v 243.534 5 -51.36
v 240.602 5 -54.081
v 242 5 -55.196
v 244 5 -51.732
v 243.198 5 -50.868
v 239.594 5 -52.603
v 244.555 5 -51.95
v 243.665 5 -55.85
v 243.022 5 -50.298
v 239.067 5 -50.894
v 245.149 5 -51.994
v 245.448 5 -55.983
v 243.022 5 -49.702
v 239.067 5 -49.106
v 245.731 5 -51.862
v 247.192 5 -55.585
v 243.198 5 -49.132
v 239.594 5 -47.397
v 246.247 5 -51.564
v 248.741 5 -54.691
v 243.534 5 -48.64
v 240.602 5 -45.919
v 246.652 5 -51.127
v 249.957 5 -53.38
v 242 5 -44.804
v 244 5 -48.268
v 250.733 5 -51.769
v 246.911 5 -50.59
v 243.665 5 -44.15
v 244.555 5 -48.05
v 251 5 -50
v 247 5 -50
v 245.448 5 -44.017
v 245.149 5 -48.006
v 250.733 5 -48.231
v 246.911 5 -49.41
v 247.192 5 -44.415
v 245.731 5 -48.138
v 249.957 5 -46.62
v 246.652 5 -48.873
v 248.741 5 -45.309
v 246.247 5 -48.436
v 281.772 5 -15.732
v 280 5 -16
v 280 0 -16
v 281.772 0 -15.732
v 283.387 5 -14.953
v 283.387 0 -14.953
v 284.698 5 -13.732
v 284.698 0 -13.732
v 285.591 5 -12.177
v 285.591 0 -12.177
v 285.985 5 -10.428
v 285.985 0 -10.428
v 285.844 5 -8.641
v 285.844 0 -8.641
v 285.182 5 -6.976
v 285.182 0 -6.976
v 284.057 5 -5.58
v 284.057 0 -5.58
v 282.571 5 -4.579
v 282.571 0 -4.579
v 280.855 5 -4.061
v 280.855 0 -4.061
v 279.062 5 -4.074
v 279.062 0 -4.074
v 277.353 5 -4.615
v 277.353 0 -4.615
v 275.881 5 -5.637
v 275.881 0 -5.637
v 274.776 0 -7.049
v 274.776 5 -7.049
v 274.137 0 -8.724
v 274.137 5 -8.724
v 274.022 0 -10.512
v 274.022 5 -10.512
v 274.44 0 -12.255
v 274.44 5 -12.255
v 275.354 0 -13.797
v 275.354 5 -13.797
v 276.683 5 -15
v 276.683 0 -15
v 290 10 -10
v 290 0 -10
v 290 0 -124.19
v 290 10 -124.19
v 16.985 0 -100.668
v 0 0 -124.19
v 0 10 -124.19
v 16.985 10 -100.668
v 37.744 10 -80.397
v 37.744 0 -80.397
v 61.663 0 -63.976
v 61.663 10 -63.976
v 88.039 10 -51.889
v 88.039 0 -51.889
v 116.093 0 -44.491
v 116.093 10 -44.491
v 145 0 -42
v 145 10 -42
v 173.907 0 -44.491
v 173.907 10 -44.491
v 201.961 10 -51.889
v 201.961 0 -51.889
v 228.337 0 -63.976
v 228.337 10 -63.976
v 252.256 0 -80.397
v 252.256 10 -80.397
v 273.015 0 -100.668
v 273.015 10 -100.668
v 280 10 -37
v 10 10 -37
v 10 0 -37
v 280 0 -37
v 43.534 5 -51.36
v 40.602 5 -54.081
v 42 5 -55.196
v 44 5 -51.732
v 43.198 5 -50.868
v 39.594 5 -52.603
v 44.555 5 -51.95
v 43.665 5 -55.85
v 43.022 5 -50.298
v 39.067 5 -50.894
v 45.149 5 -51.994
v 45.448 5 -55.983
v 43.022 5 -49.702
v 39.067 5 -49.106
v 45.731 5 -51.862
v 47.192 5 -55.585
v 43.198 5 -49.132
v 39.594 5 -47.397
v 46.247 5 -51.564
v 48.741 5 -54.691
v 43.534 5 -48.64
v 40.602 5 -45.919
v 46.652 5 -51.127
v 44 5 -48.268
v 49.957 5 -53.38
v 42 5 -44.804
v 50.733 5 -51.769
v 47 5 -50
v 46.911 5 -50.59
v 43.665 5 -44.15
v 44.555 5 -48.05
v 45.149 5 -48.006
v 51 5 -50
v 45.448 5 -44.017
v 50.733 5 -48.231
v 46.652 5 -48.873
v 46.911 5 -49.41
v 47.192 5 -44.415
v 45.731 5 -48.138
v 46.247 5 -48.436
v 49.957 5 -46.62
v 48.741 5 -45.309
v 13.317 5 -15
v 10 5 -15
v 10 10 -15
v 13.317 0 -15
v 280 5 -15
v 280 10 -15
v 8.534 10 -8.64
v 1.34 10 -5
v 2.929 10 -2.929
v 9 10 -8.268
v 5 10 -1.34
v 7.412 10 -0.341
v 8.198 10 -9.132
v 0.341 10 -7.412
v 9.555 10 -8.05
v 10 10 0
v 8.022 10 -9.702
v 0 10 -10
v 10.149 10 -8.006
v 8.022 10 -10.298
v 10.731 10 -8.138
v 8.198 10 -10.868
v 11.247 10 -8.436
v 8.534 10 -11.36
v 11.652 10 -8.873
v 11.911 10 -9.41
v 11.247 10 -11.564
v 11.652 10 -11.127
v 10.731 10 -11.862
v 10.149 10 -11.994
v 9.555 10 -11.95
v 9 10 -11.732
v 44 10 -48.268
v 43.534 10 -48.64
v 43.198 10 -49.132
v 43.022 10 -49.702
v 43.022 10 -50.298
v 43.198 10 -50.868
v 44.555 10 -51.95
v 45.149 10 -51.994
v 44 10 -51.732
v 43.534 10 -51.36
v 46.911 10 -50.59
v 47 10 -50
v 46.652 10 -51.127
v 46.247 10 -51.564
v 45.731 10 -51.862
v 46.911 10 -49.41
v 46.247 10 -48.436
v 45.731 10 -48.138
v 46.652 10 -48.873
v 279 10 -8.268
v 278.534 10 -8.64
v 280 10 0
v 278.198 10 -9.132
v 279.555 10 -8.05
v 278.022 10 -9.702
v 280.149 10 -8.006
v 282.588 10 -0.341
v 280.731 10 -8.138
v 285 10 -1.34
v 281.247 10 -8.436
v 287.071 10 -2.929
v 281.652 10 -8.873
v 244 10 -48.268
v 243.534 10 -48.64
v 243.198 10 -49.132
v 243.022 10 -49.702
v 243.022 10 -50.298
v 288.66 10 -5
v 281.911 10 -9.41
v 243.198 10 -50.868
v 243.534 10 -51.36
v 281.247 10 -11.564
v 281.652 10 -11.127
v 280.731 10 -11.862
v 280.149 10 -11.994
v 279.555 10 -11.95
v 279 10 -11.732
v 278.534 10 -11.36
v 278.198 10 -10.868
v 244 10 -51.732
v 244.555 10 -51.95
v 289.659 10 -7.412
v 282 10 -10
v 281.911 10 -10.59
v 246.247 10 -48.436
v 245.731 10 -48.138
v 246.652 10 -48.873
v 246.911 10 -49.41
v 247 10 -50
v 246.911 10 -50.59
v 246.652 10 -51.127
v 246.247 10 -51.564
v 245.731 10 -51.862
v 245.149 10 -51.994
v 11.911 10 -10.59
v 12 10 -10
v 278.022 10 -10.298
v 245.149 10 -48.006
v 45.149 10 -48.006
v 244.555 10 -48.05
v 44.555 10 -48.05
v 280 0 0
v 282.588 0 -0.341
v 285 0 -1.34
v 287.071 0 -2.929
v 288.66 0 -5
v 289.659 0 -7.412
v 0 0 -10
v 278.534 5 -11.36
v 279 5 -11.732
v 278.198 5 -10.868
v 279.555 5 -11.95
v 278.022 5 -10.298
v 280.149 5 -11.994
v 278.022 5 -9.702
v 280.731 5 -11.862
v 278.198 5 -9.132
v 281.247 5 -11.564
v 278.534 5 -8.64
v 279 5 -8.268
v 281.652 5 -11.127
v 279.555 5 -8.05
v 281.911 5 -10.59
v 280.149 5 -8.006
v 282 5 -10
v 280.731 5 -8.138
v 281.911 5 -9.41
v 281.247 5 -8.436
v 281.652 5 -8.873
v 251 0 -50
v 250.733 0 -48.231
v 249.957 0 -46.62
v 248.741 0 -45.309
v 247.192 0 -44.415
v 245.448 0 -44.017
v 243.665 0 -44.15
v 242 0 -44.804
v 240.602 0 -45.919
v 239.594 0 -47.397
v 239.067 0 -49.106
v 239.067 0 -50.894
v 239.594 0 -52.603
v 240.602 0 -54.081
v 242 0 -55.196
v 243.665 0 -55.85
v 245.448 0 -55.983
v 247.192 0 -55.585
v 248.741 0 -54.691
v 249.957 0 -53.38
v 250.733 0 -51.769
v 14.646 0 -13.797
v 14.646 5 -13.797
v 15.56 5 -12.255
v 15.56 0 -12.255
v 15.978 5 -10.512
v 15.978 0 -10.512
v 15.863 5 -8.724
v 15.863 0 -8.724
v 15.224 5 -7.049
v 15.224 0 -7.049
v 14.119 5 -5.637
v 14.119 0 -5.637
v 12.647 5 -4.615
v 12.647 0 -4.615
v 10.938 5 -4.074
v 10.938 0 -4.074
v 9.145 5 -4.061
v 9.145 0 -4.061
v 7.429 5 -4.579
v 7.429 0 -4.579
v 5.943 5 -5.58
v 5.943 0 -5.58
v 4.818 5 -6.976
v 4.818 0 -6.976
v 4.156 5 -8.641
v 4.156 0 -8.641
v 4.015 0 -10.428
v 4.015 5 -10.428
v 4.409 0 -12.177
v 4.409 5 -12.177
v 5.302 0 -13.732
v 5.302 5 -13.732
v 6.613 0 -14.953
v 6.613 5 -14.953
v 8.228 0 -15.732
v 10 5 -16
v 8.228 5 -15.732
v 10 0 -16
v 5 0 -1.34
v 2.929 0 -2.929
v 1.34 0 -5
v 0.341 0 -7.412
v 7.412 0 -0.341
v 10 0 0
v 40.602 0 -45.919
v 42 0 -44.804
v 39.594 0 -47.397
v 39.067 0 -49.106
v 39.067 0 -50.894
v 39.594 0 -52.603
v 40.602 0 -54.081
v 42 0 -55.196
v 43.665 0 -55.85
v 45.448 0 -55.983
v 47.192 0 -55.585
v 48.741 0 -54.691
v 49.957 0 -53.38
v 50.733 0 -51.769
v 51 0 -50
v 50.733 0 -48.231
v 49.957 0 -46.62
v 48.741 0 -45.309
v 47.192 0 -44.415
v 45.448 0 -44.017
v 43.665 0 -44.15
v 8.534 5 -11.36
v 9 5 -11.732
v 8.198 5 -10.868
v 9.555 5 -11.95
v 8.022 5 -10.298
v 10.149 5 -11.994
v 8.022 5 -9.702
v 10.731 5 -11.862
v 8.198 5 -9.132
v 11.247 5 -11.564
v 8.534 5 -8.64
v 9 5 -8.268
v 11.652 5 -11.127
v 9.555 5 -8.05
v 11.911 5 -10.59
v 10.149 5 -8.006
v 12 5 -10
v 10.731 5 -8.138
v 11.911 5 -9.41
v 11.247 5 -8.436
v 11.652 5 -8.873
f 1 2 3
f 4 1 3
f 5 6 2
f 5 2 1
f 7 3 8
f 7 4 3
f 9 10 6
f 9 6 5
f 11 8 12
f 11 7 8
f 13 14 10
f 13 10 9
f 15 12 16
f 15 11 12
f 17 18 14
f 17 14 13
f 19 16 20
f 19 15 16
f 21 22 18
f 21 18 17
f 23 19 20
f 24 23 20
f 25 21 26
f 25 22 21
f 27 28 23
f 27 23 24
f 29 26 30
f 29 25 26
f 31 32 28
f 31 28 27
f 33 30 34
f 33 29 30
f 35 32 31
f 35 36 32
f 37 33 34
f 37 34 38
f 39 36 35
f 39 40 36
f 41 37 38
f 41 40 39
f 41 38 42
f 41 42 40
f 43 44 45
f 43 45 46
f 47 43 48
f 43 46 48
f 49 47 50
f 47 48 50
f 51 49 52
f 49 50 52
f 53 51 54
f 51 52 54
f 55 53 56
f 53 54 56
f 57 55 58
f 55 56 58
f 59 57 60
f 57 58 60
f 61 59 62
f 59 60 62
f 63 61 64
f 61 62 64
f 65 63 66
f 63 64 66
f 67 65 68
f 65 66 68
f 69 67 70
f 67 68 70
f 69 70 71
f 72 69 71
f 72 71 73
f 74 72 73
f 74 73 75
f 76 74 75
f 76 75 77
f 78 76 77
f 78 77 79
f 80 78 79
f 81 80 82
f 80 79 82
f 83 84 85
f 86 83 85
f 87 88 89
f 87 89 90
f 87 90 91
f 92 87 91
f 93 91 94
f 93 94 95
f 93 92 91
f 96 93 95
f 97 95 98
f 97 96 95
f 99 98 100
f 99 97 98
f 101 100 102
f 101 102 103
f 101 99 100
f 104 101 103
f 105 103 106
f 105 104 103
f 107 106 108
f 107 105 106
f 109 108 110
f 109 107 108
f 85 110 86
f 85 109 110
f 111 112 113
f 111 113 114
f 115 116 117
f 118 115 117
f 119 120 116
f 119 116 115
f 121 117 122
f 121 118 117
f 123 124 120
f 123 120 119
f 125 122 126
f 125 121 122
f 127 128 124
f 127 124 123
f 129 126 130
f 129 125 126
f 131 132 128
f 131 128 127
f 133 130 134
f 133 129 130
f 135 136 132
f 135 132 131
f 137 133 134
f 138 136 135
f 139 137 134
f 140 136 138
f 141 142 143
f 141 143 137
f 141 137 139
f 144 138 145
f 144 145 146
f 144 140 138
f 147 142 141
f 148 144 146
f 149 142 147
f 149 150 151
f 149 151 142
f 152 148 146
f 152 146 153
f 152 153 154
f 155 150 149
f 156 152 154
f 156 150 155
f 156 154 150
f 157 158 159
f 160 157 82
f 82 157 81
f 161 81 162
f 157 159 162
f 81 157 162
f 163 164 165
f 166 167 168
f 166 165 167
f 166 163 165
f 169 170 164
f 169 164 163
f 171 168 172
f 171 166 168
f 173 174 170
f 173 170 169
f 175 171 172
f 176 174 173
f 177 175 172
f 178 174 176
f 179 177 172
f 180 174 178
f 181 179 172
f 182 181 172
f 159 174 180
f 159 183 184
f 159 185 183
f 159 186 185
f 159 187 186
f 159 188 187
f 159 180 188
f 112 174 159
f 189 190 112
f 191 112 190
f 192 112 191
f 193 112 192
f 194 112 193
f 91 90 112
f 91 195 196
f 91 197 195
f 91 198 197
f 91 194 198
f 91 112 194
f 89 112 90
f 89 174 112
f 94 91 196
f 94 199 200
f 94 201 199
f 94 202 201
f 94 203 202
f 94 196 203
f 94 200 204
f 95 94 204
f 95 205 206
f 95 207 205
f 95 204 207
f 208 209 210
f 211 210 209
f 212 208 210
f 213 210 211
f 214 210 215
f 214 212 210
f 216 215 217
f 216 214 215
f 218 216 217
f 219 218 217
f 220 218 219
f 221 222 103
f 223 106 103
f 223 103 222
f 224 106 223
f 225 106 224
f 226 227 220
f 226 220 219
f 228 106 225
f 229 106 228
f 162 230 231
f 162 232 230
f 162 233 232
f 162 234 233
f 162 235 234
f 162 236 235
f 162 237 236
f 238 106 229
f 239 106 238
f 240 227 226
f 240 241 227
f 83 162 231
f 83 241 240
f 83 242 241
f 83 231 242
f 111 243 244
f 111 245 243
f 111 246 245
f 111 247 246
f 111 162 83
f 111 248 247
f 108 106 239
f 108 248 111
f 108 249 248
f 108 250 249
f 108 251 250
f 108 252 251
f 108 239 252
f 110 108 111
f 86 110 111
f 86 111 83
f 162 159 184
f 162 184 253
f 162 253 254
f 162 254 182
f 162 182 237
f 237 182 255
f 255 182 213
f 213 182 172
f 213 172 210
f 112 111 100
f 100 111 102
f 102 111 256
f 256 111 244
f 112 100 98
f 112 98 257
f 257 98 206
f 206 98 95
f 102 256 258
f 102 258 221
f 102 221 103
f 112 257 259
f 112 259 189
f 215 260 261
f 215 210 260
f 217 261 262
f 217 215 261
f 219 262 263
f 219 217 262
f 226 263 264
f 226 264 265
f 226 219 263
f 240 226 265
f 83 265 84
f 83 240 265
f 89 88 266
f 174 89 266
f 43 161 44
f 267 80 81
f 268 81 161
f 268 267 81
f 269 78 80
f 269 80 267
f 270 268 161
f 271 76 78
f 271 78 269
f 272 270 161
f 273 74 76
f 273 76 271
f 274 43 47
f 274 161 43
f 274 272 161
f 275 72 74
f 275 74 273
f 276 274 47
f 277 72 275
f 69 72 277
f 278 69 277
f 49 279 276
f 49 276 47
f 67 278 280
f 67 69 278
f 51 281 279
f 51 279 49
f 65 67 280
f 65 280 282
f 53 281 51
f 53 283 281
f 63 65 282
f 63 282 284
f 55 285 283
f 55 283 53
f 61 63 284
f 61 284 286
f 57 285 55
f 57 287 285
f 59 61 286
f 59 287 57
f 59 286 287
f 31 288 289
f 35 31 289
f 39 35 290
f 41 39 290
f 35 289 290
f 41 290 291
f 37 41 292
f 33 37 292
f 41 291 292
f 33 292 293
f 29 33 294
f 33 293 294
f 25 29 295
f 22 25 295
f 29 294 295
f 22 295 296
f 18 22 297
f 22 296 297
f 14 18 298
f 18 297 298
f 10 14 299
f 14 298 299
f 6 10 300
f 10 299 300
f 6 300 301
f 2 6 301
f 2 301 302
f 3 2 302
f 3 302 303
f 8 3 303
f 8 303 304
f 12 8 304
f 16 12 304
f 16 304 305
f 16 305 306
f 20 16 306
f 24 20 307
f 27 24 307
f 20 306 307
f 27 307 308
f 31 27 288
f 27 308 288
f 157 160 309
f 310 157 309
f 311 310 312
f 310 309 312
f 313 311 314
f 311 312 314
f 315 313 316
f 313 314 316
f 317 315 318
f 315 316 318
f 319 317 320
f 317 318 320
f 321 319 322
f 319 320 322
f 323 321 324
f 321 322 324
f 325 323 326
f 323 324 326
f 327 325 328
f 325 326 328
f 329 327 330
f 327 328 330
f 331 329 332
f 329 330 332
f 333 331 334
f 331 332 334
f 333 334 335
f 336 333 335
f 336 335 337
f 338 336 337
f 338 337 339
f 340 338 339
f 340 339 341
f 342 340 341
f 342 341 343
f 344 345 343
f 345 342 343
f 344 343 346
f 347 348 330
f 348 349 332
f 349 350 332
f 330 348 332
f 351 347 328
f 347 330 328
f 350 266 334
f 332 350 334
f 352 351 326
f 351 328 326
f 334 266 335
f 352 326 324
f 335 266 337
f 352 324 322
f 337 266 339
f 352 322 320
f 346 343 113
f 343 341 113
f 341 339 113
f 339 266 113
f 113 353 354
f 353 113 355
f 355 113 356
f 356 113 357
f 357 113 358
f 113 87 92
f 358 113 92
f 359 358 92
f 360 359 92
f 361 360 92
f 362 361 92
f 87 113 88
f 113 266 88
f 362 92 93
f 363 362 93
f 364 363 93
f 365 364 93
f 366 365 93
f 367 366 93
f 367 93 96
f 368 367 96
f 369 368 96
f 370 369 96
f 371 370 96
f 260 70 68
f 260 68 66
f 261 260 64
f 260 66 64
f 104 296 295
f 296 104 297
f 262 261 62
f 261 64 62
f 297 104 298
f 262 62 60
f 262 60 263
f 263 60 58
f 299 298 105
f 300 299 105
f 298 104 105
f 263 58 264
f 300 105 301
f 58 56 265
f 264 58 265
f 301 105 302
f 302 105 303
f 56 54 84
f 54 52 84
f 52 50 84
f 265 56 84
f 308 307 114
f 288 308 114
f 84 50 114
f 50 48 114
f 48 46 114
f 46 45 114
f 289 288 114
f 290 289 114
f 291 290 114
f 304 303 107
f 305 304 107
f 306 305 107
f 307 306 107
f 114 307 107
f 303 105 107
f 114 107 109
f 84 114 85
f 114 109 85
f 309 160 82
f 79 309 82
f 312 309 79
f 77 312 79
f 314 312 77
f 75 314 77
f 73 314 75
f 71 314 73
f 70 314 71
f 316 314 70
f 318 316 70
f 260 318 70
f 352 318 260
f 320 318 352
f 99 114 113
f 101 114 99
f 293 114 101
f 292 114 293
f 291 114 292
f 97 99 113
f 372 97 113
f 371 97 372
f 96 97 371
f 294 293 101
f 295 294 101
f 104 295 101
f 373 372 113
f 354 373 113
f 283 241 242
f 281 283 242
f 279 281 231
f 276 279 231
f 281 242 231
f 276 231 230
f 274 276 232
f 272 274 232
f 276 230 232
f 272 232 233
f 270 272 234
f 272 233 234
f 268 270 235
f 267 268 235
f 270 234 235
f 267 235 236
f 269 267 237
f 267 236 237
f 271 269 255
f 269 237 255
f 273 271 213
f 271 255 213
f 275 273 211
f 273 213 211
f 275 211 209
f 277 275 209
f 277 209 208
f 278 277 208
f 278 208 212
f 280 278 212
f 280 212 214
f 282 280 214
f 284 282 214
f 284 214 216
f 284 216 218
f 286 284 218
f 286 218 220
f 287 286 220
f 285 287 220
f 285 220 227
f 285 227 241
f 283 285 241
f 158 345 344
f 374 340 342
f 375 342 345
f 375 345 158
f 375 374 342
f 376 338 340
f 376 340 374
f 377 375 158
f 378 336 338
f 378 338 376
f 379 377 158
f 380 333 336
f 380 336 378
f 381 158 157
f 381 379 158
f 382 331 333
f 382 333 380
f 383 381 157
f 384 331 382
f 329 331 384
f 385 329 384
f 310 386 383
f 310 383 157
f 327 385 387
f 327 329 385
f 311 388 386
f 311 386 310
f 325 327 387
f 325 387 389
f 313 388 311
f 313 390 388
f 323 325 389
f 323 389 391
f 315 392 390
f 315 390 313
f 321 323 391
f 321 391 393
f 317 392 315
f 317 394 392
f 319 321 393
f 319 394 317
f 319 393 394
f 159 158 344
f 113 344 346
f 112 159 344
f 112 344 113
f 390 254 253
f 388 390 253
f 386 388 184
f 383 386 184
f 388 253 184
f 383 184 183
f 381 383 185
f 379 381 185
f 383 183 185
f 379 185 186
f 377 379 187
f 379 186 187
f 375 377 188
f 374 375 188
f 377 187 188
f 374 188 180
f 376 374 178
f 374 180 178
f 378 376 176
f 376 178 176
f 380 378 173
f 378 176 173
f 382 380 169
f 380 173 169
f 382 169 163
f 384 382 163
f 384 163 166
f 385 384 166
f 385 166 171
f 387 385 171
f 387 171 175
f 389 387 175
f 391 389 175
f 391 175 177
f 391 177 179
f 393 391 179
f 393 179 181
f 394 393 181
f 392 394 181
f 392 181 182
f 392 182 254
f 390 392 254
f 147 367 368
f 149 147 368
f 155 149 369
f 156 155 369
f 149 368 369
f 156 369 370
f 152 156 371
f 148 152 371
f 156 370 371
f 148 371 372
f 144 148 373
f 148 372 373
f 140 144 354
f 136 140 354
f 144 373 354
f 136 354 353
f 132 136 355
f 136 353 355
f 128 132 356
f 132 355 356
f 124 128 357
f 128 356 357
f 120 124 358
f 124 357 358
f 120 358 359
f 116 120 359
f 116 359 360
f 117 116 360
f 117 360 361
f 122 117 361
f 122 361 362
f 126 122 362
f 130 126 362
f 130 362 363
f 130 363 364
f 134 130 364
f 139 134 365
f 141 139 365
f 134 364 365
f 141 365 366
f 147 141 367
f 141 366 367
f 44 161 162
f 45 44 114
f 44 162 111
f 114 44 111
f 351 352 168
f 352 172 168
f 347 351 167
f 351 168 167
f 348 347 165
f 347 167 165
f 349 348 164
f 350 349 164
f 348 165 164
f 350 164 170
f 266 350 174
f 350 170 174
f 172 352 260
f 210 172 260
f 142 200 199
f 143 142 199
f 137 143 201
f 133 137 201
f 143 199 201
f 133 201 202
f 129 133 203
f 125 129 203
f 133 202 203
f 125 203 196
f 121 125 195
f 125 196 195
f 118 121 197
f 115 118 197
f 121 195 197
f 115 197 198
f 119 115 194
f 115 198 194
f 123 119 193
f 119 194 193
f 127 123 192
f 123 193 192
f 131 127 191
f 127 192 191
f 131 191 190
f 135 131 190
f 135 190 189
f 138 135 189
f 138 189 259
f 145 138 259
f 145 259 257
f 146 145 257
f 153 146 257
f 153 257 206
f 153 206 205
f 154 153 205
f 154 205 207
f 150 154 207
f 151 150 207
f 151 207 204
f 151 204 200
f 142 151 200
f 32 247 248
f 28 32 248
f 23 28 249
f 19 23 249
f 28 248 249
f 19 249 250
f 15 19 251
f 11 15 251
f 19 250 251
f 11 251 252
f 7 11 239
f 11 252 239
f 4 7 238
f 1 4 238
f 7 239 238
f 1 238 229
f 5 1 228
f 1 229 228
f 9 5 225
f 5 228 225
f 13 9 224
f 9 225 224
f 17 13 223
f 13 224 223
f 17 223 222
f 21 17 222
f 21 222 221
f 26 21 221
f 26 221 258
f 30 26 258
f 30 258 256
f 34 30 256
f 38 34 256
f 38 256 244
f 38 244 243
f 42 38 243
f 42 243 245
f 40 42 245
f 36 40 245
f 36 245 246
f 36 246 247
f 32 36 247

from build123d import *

# Parameters (mm, degrees)
BOSS_EXTRU_1_DEPTH      = 10
ESQUISSE3_R             = 2
ENL_V_MAT_EXTRU_1_DEPTH = 10
CONG_1_R                = 10
ESQUISSE4_R             = 32.5
ENL_V_MAT_EXTRU_2_DEPTH = 10
ESQUISSE5_R             = 2
ENL_V_MAT_EXTRU_3_DEPTH = 10
ESQUISSE6_W             = 270
ESQUISSE6_H             = 22
ENL_V_MAT_EXTRU_4_DEPTH = 10
ESQUISSE7_R             = 2
ENL_V_MAT_EXTRU_5_DEPTH = 10
ENL_V_MAT_EXTRU_6_DEPTH = 10
ESQUISSE9_R             = 2
ENL_V_MAT_EXTRU_7_DEPTH = 10
ESQUISSE10_R            = 6
ENL_V_MAT_EXTRU_8_DEPTH = 5


with BuildPart() as part:
    # Esquisse2 → Boss.-Extru.1 (new body)
    with BuildSketch(Plane(origin=(0, 0, 0), x_dir=(1, 0, 0), z_dir=(0, 1, 0))):
        Polygon((0, 0), (290, 0), (290, 180), (275, 180), (225, 130), (65, 130), (15, 180), (0, 180), align=None)
    extrude(amount=BOSS_EXTRU_1_DEPTH)

    # Esquisse3 → Enlèv. mat.-Extru.1 (cut)
    with BuildSketch(Plane(origin=(0, 10, 0), x_dir=(1, 0, 0), z_dir=(0, 1, 0))):
        with Locations((10, 10)):
            Circle(ESQUISSE3_R)
        with Locations((280, 10)):
            Circle(ESQUISSE3_R)
    extrude(amount=-ENL_V_MAT_EXTRU_1_DEPTH, mode=Mode.SUBTRACT)

    # Congé1
    cong_1_edges = [part.edges().sort_by_distance(p)[0] for p in [
        (290, 5, 0),
        (0, 5, 0),
    ]]
    fillet(cong_1_edges, radius=CONG_1_R)

    # Esquisse4 → Enlèv. mat.-Extru.2 (cut)
    with BuildSketch(Plane.XZ):
        with Locations((239.106279441, -116.309672248)):
            Circle(ESQUISSE4_R)
        with Locations((179.153264776, -81.942630954)):
            Circle(ESQUISSE4_R)
        with Locations((110.048910395, -82.156407472)):
            Circle(ESQUISSE4_R)
        with Locations((50.309672248, -116.893720559)):
            Circle(ESQUISSE4_R)
    extrude(amount=-ENL_V_MAT_EXTRU_2_DEPTH, mode=Mode.SUBTRACT)

    # Esquisse5 → Enlèv. mat.-Extru.3 (cut)
    with BuildSketch(Plane(origin=(0, 0, 0), x_dir=(-1, 0, 0), z_dir=(0, -1, 0))):
        with Locations((-144.50570114, 101.001110603)):
            Circle(ESQUISSE5_R)
        with Locations((-199.571369329, 115.491017964)):
            Circle(ESQUISSE5_R)
        with Locations((-221.896020418, 76.419161677)):
            Circle(ESQUISSE5_R)
        with Locations((-66.897585359, 77.115673706)):
            Circle(ESQUISSE5_R)
        with Locations((-89.572479932, 115.985316824)):
            Circle(ESQUISSE5_R)
    extrude(amount=-ENL_V_MAT_EXTRU_3_DEPTH, mode=Mode.SUBTRACT)

    # Esquisse6 → Enlèv. mat.-Extru.4 (cut)
    with BuildSketch(Plane(origin=(0, 10, 0), x_dir=(1, 0, 0), z_dir=(0, 1, 0))):
        with Locations((145, 26)):
            Rectangle(ESQUISSE6_W, ESQUISSE6_H)
    extrude(amount=-ENL_V_MAT_EXTRU_4_DEPTH, mode=Mode.SUBTRACT)

    # Esquisse7 → Enlèv. mat.-Extru.5 (cut)
    with BuildSketch(Plane(origin=(0, 10, 0), x_dir=(1, 0, 0), z_dir=(0, 1, 0))):
        with Locations((10, 165)):
            Circle(ESQUISSE7_R)
        with Locations((280, 165)):
            Circle(ESQUISSE7_R)
    extrude(amount=-ENL_V_MAT_EXTRU_5_DEPTH, mode=Mode.SUBTRACT)

    # Esquisse8 → Enlèv. mat.-Extru.6 (cut)
    with BuildSketch(Plane.XZ):
        with BuildLine():
            Line((290, -124.189862343), (307.144293733, -133.59002346))
            Line((307.144293733, -133.59002346), (298.572146866, -188.47958085))
            Line((298.572146866, -188.47958085), (-31.012454314, -192.613510827))
            Line((-31.012454314, -192.613510827), (-21.06069283, -128.889942902))
            Line((-21.06069283, -128.889942902), (0, -124.189862343))
            ThreePointArc((0, -124.189862343), (145, -42), (290, -124.189862343))
        make_face()
    extrude(amount=-ENL_V_MAT_EXTRU_6_DEPTH, mode=Mode.SUBTRACT)

    # Esquisse9 → Enlèv. mat.-Extru.7 (cut)
    with BuildSketch(Plane(origin=(0, 10, 0), x_dir=(1, 0, 0), z_dir=(0, 1, 0))):
        with Locations((45, 50)):
            Circle(ESQUISSE9_R)
        with Locations((245, 50)):
            Circle(ESQUISSE9_R)
    extrude(amount=-ENL_V_MAT_EXTRU_7_DEPTH, mode=Mode.SUBTRACT)

    # Esquisse10 → Enlèv. mat.-Extru.8 (cut)
    with BuildSketch(Plane.XZ):
        with Locations((10, -10)):
            Circle(ESQUISSE10_R)
        with Locations((45, -50)):
            Circle(ESQUISSE10_R)
        with Locations((245, -50)):
            Circle(ESQUISSE10_R)
        with Locations((280, -10)):
            Circle(ESQUISSE10_R)
    extrude(amount=-ENL_V_MAT_EXTRU_8_DEPTH, mode=Mode.SUBTRACT)


solid = part.part
